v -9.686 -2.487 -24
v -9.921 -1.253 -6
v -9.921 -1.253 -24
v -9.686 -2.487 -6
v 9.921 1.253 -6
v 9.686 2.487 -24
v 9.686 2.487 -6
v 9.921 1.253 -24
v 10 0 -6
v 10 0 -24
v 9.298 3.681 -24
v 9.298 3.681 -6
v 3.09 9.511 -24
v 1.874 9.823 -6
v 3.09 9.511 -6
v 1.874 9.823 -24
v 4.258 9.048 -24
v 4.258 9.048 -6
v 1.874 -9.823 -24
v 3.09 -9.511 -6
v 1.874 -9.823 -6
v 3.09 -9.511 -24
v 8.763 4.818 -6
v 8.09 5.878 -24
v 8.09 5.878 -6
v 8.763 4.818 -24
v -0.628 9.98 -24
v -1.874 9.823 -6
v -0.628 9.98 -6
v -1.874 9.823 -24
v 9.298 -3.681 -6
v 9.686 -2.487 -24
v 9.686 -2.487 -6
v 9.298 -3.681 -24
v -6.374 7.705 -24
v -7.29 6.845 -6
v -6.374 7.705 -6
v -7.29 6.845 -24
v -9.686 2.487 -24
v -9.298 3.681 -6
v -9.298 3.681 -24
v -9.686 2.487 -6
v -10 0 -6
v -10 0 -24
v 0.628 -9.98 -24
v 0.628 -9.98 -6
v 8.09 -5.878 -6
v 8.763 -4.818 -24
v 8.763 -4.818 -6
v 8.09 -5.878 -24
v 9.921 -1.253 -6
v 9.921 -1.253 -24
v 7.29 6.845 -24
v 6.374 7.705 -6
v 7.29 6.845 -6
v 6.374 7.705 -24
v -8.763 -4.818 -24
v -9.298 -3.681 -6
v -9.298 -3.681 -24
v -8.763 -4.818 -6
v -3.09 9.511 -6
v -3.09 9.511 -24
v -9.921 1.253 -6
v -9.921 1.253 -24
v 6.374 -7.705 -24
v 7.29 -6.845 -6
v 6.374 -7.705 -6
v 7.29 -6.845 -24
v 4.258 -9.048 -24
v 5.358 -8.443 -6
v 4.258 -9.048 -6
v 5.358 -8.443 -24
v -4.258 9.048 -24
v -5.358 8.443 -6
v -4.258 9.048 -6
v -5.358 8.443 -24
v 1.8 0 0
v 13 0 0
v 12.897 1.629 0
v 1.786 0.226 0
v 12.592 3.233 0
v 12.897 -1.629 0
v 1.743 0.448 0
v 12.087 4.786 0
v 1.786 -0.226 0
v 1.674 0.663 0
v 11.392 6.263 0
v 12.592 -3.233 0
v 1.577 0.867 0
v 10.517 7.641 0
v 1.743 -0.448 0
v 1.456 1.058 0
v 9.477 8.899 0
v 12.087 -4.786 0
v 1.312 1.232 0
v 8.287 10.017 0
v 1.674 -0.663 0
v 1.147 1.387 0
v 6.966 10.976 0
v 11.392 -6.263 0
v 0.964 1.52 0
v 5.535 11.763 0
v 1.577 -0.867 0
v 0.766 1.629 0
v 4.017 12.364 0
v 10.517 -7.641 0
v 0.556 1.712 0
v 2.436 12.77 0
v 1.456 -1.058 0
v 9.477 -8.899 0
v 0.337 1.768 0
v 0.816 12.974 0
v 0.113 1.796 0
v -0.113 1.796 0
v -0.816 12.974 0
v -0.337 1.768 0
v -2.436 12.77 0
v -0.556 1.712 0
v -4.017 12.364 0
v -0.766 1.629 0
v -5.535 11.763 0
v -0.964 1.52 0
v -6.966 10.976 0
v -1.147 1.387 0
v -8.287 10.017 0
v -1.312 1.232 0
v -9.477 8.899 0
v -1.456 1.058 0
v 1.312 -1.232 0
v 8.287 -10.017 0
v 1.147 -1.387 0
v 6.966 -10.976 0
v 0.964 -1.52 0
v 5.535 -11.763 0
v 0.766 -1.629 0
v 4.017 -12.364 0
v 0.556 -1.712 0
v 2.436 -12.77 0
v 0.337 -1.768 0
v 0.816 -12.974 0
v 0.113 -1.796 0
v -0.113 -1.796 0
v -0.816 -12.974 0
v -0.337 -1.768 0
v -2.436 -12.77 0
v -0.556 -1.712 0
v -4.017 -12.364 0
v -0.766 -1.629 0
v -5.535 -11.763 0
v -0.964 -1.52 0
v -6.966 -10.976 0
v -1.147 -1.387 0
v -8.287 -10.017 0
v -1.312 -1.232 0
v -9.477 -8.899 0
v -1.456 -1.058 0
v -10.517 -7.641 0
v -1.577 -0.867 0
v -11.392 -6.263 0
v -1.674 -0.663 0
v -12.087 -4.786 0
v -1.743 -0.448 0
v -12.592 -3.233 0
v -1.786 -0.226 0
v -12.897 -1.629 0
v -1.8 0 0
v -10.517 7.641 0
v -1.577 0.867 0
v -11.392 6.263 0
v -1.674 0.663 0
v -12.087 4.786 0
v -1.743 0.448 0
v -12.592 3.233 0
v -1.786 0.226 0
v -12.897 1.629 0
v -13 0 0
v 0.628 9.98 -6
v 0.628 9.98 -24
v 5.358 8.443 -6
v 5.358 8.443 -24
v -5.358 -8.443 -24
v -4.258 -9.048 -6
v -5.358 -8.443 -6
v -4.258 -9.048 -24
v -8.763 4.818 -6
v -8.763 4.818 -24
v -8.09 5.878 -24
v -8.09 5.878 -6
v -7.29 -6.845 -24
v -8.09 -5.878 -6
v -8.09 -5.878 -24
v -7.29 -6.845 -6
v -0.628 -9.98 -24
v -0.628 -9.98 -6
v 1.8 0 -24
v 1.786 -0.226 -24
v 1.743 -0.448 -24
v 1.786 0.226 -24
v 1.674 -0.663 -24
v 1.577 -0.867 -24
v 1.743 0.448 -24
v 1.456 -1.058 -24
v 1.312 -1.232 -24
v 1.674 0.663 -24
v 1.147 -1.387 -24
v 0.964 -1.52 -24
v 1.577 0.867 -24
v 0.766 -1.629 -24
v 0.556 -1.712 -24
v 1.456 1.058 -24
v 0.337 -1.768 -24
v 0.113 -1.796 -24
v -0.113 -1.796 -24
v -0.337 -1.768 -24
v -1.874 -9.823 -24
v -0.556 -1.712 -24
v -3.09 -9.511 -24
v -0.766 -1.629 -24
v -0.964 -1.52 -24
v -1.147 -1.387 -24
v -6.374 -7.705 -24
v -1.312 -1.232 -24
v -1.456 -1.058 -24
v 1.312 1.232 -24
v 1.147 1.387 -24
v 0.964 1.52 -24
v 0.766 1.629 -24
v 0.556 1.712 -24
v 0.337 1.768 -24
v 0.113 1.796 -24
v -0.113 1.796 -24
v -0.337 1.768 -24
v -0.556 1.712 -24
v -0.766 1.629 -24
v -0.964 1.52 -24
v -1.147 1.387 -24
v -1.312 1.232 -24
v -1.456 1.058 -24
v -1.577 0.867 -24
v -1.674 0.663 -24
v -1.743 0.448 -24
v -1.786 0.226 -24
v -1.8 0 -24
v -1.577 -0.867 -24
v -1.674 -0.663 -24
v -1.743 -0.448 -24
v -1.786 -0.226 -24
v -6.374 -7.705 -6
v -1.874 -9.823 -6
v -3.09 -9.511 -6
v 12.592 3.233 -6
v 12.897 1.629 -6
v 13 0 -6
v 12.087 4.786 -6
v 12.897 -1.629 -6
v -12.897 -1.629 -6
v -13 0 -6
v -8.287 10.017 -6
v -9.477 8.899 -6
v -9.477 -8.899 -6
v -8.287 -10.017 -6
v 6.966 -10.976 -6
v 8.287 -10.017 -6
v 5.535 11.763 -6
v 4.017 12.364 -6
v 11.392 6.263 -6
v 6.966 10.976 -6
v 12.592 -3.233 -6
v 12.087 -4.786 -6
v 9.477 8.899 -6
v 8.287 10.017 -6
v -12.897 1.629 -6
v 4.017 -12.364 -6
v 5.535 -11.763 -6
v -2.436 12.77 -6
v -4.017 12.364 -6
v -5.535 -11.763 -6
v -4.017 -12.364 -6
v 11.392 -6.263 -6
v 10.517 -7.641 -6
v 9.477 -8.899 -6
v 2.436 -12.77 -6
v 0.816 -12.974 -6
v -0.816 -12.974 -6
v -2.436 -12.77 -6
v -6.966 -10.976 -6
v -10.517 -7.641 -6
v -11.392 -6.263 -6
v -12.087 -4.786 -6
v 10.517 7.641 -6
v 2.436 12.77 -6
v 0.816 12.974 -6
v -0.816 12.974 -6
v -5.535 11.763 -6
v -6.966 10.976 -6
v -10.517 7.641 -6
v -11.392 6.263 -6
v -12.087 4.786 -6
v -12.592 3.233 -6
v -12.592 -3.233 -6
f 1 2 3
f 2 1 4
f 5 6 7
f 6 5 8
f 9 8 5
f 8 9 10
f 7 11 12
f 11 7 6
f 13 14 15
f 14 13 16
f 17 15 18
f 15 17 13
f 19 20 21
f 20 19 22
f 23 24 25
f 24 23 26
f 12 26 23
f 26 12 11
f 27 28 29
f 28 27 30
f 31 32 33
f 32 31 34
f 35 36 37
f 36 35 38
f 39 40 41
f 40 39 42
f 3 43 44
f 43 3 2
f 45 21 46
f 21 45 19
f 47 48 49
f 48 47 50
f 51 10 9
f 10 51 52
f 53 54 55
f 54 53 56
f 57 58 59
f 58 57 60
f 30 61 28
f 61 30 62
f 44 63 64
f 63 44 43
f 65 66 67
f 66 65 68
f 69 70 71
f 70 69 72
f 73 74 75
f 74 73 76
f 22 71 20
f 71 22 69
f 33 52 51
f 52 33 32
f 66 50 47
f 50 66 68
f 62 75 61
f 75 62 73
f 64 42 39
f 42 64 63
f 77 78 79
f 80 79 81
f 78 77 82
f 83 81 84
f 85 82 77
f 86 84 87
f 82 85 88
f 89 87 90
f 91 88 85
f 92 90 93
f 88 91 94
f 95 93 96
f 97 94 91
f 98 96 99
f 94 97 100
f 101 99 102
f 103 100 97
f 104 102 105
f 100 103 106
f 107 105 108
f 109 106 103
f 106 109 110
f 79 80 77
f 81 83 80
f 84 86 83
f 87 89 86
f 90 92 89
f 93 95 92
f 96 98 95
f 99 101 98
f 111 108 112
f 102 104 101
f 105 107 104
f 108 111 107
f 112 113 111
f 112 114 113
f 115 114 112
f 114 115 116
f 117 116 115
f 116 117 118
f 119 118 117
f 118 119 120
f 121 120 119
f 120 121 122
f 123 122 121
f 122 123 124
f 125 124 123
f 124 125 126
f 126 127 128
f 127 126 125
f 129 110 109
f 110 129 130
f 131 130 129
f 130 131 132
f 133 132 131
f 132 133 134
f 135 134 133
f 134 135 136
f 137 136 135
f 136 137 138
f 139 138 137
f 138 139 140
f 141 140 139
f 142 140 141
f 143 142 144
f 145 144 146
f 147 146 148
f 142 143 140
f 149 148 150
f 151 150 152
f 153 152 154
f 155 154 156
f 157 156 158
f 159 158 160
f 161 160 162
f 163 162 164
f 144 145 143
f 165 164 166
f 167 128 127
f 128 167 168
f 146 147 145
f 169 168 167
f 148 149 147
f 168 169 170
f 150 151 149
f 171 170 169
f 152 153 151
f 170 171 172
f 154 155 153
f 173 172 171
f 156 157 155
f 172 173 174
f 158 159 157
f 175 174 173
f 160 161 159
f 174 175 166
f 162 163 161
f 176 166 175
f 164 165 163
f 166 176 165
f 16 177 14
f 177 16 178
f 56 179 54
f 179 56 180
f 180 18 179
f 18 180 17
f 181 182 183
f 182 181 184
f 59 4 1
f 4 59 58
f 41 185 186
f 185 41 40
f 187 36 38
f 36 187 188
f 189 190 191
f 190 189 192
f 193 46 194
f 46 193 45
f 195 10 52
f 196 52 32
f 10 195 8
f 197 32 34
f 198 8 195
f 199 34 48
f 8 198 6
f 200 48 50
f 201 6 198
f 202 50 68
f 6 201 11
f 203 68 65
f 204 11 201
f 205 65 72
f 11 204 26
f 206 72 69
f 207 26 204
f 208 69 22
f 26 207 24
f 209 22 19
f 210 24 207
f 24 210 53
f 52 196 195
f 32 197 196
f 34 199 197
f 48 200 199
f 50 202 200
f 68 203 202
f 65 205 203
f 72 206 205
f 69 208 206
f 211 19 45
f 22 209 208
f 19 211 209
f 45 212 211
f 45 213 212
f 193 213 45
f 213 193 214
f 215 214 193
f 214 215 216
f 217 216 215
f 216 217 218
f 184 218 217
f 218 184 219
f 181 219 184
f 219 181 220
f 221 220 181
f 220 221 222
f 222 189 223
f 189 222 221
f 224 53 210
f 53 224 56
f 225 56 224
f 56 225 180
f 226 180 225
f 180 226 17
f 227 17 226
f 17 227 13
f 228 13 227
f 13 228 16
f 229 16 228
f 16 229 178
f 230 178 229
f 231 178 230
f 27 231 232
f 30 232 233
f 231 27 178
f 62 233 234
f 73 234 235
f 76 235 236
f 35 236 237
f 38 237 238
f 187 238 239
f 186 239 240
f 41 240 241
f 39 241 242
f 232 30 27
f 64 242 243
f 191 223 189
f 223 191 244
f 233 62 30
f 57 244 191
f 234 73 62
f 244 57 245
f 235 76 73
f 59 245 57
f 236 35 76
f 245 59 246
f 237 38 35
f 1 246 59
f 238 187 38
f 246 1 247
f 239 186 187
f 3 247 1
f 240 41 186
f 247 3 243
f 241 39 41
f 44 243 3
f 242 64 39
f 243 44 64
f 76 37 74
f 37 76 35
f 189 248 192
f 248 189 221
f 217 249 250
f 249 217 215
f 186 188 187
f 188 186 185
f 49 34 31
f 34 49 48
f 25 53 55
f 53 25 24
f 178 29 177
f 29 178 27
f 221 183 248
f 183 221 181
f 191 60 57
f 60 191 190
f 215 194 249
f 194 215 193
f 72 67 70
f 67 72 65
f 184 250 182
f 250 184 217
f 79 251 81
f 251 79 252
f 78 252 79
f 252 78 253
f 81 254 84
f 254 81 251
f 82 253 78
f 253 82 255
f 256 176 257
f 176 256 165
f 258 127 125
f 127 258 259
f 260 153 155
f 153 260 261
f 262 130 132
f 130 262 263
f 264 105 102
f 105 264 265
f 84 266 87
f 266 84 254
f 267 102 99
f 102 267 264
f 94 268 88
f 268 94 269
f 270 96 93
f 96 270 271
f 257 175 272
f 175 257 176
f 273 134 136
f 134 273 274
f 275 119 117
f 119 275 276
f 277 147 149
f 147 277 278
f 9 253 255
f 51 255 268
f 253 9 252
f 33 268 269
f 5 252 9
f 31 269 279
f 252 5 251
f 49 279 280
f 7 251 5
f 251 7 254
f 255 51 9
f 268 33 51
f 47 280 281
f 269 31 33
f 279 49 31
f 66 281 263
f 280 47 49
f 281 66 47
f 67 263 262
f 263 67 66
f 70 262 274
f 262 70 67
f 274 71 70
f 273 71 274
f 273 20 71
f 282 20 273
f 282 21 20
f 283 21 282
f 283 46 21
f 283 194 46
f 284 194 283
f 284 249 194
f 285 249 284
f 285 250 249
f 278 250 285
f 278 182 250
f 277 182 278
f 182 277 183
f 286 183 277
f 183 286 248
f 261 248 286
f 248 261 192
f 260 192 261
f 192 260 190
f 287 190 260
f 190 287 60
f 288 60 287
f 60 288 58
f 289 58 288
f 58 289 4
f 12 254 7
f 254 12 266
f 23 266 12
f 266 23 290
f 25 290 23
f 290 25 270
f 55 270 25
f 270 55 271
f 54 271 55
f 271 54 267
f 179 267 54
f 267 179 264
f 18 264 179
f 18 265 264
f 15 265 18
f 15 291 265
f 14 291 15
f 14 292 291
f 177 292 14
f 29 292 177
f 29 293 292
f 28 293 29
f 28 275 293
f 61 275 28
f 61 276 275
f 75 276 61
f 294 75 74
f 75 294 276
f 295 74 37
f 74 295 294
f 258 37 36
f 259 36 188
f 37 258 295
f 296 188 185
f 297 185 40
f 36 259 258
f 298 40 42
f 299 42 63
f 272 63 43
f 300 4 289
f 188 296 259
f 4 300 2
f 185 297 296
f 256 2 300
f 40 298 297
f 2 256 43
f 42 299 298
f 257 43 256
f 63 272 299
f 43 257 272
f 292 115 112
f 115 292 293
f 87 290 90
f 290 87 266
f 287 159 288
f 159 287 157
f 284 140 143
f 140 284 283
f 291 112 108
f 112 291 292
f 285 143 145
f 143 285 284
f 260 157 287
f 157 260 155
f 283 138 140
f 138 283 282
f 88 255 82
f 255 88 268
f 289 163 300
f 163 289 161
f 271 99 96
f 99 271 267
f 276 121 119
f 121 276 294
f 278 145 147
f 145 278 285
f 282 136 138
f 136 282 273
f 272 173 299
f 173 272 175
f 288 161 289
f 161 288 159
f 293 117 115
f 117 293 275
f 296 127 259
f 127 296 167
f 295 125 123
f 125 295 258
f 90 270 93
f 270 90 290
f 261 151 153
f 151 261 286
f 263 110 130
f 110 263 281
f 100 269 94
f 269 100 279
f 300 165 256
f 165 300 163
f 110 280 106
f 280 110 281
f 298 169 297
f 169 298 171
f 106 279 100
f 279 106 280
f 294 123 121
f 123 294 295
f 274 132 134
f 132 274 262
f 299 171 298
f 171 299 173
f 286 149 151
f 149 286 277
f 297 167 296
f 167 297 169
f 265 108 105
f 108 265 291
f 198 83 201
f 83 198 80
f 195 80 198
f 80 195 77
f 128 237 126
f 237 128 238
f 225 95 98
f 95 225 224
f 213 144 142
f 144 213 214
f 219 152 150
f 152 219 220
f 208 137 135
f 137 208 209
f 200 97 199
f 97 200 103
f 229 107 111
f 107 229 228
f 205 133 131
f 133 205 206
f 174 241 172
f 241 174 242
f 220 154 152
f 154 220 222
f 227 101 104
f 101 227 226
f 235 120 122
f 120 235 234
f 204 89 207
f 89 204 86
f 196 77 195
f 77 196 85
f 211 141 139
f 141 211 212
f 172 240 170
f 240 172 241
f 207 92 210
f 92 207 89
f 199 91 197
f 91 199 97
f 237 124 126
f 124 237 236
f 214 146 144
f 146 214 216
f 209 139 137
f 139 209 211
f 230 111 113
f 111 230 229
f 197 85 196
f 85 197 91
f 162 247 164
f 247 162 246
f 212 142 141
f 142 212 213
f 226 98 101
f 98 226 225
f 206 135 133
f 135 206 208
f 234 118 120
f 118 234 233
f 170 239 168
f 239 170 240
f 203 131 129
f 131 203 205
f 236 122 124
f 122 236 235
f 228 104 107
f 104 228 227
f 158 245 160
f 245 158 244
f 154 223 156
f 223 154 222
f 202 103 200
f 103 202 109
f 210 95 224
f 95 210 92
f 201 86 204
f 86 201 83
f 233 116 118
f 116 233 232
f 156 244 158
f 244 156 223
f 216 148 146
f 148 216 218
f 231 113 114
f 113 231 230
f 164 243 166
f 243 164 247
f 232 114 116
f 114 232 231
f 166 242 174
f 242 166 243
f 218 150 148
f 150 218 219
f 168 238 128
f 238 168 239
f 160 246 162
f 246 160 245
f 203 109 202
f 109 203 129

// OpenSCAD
$fn = 50;


difference() {
	union() {
		translate(v = [0, 0, -24.0000000000]) {
			cylinder(h = 24, r = 10.0000000000);
		}
		translate(v = [0, 0, -6.0000000000]) {
			cylinder(h = 6, r = 13.0000000000);
		}
	}
	union() {
		#translate(v = [0, 0, -24]) {
			cylinder(h = 24, r = 1.8000000000);
		}
	}
}
